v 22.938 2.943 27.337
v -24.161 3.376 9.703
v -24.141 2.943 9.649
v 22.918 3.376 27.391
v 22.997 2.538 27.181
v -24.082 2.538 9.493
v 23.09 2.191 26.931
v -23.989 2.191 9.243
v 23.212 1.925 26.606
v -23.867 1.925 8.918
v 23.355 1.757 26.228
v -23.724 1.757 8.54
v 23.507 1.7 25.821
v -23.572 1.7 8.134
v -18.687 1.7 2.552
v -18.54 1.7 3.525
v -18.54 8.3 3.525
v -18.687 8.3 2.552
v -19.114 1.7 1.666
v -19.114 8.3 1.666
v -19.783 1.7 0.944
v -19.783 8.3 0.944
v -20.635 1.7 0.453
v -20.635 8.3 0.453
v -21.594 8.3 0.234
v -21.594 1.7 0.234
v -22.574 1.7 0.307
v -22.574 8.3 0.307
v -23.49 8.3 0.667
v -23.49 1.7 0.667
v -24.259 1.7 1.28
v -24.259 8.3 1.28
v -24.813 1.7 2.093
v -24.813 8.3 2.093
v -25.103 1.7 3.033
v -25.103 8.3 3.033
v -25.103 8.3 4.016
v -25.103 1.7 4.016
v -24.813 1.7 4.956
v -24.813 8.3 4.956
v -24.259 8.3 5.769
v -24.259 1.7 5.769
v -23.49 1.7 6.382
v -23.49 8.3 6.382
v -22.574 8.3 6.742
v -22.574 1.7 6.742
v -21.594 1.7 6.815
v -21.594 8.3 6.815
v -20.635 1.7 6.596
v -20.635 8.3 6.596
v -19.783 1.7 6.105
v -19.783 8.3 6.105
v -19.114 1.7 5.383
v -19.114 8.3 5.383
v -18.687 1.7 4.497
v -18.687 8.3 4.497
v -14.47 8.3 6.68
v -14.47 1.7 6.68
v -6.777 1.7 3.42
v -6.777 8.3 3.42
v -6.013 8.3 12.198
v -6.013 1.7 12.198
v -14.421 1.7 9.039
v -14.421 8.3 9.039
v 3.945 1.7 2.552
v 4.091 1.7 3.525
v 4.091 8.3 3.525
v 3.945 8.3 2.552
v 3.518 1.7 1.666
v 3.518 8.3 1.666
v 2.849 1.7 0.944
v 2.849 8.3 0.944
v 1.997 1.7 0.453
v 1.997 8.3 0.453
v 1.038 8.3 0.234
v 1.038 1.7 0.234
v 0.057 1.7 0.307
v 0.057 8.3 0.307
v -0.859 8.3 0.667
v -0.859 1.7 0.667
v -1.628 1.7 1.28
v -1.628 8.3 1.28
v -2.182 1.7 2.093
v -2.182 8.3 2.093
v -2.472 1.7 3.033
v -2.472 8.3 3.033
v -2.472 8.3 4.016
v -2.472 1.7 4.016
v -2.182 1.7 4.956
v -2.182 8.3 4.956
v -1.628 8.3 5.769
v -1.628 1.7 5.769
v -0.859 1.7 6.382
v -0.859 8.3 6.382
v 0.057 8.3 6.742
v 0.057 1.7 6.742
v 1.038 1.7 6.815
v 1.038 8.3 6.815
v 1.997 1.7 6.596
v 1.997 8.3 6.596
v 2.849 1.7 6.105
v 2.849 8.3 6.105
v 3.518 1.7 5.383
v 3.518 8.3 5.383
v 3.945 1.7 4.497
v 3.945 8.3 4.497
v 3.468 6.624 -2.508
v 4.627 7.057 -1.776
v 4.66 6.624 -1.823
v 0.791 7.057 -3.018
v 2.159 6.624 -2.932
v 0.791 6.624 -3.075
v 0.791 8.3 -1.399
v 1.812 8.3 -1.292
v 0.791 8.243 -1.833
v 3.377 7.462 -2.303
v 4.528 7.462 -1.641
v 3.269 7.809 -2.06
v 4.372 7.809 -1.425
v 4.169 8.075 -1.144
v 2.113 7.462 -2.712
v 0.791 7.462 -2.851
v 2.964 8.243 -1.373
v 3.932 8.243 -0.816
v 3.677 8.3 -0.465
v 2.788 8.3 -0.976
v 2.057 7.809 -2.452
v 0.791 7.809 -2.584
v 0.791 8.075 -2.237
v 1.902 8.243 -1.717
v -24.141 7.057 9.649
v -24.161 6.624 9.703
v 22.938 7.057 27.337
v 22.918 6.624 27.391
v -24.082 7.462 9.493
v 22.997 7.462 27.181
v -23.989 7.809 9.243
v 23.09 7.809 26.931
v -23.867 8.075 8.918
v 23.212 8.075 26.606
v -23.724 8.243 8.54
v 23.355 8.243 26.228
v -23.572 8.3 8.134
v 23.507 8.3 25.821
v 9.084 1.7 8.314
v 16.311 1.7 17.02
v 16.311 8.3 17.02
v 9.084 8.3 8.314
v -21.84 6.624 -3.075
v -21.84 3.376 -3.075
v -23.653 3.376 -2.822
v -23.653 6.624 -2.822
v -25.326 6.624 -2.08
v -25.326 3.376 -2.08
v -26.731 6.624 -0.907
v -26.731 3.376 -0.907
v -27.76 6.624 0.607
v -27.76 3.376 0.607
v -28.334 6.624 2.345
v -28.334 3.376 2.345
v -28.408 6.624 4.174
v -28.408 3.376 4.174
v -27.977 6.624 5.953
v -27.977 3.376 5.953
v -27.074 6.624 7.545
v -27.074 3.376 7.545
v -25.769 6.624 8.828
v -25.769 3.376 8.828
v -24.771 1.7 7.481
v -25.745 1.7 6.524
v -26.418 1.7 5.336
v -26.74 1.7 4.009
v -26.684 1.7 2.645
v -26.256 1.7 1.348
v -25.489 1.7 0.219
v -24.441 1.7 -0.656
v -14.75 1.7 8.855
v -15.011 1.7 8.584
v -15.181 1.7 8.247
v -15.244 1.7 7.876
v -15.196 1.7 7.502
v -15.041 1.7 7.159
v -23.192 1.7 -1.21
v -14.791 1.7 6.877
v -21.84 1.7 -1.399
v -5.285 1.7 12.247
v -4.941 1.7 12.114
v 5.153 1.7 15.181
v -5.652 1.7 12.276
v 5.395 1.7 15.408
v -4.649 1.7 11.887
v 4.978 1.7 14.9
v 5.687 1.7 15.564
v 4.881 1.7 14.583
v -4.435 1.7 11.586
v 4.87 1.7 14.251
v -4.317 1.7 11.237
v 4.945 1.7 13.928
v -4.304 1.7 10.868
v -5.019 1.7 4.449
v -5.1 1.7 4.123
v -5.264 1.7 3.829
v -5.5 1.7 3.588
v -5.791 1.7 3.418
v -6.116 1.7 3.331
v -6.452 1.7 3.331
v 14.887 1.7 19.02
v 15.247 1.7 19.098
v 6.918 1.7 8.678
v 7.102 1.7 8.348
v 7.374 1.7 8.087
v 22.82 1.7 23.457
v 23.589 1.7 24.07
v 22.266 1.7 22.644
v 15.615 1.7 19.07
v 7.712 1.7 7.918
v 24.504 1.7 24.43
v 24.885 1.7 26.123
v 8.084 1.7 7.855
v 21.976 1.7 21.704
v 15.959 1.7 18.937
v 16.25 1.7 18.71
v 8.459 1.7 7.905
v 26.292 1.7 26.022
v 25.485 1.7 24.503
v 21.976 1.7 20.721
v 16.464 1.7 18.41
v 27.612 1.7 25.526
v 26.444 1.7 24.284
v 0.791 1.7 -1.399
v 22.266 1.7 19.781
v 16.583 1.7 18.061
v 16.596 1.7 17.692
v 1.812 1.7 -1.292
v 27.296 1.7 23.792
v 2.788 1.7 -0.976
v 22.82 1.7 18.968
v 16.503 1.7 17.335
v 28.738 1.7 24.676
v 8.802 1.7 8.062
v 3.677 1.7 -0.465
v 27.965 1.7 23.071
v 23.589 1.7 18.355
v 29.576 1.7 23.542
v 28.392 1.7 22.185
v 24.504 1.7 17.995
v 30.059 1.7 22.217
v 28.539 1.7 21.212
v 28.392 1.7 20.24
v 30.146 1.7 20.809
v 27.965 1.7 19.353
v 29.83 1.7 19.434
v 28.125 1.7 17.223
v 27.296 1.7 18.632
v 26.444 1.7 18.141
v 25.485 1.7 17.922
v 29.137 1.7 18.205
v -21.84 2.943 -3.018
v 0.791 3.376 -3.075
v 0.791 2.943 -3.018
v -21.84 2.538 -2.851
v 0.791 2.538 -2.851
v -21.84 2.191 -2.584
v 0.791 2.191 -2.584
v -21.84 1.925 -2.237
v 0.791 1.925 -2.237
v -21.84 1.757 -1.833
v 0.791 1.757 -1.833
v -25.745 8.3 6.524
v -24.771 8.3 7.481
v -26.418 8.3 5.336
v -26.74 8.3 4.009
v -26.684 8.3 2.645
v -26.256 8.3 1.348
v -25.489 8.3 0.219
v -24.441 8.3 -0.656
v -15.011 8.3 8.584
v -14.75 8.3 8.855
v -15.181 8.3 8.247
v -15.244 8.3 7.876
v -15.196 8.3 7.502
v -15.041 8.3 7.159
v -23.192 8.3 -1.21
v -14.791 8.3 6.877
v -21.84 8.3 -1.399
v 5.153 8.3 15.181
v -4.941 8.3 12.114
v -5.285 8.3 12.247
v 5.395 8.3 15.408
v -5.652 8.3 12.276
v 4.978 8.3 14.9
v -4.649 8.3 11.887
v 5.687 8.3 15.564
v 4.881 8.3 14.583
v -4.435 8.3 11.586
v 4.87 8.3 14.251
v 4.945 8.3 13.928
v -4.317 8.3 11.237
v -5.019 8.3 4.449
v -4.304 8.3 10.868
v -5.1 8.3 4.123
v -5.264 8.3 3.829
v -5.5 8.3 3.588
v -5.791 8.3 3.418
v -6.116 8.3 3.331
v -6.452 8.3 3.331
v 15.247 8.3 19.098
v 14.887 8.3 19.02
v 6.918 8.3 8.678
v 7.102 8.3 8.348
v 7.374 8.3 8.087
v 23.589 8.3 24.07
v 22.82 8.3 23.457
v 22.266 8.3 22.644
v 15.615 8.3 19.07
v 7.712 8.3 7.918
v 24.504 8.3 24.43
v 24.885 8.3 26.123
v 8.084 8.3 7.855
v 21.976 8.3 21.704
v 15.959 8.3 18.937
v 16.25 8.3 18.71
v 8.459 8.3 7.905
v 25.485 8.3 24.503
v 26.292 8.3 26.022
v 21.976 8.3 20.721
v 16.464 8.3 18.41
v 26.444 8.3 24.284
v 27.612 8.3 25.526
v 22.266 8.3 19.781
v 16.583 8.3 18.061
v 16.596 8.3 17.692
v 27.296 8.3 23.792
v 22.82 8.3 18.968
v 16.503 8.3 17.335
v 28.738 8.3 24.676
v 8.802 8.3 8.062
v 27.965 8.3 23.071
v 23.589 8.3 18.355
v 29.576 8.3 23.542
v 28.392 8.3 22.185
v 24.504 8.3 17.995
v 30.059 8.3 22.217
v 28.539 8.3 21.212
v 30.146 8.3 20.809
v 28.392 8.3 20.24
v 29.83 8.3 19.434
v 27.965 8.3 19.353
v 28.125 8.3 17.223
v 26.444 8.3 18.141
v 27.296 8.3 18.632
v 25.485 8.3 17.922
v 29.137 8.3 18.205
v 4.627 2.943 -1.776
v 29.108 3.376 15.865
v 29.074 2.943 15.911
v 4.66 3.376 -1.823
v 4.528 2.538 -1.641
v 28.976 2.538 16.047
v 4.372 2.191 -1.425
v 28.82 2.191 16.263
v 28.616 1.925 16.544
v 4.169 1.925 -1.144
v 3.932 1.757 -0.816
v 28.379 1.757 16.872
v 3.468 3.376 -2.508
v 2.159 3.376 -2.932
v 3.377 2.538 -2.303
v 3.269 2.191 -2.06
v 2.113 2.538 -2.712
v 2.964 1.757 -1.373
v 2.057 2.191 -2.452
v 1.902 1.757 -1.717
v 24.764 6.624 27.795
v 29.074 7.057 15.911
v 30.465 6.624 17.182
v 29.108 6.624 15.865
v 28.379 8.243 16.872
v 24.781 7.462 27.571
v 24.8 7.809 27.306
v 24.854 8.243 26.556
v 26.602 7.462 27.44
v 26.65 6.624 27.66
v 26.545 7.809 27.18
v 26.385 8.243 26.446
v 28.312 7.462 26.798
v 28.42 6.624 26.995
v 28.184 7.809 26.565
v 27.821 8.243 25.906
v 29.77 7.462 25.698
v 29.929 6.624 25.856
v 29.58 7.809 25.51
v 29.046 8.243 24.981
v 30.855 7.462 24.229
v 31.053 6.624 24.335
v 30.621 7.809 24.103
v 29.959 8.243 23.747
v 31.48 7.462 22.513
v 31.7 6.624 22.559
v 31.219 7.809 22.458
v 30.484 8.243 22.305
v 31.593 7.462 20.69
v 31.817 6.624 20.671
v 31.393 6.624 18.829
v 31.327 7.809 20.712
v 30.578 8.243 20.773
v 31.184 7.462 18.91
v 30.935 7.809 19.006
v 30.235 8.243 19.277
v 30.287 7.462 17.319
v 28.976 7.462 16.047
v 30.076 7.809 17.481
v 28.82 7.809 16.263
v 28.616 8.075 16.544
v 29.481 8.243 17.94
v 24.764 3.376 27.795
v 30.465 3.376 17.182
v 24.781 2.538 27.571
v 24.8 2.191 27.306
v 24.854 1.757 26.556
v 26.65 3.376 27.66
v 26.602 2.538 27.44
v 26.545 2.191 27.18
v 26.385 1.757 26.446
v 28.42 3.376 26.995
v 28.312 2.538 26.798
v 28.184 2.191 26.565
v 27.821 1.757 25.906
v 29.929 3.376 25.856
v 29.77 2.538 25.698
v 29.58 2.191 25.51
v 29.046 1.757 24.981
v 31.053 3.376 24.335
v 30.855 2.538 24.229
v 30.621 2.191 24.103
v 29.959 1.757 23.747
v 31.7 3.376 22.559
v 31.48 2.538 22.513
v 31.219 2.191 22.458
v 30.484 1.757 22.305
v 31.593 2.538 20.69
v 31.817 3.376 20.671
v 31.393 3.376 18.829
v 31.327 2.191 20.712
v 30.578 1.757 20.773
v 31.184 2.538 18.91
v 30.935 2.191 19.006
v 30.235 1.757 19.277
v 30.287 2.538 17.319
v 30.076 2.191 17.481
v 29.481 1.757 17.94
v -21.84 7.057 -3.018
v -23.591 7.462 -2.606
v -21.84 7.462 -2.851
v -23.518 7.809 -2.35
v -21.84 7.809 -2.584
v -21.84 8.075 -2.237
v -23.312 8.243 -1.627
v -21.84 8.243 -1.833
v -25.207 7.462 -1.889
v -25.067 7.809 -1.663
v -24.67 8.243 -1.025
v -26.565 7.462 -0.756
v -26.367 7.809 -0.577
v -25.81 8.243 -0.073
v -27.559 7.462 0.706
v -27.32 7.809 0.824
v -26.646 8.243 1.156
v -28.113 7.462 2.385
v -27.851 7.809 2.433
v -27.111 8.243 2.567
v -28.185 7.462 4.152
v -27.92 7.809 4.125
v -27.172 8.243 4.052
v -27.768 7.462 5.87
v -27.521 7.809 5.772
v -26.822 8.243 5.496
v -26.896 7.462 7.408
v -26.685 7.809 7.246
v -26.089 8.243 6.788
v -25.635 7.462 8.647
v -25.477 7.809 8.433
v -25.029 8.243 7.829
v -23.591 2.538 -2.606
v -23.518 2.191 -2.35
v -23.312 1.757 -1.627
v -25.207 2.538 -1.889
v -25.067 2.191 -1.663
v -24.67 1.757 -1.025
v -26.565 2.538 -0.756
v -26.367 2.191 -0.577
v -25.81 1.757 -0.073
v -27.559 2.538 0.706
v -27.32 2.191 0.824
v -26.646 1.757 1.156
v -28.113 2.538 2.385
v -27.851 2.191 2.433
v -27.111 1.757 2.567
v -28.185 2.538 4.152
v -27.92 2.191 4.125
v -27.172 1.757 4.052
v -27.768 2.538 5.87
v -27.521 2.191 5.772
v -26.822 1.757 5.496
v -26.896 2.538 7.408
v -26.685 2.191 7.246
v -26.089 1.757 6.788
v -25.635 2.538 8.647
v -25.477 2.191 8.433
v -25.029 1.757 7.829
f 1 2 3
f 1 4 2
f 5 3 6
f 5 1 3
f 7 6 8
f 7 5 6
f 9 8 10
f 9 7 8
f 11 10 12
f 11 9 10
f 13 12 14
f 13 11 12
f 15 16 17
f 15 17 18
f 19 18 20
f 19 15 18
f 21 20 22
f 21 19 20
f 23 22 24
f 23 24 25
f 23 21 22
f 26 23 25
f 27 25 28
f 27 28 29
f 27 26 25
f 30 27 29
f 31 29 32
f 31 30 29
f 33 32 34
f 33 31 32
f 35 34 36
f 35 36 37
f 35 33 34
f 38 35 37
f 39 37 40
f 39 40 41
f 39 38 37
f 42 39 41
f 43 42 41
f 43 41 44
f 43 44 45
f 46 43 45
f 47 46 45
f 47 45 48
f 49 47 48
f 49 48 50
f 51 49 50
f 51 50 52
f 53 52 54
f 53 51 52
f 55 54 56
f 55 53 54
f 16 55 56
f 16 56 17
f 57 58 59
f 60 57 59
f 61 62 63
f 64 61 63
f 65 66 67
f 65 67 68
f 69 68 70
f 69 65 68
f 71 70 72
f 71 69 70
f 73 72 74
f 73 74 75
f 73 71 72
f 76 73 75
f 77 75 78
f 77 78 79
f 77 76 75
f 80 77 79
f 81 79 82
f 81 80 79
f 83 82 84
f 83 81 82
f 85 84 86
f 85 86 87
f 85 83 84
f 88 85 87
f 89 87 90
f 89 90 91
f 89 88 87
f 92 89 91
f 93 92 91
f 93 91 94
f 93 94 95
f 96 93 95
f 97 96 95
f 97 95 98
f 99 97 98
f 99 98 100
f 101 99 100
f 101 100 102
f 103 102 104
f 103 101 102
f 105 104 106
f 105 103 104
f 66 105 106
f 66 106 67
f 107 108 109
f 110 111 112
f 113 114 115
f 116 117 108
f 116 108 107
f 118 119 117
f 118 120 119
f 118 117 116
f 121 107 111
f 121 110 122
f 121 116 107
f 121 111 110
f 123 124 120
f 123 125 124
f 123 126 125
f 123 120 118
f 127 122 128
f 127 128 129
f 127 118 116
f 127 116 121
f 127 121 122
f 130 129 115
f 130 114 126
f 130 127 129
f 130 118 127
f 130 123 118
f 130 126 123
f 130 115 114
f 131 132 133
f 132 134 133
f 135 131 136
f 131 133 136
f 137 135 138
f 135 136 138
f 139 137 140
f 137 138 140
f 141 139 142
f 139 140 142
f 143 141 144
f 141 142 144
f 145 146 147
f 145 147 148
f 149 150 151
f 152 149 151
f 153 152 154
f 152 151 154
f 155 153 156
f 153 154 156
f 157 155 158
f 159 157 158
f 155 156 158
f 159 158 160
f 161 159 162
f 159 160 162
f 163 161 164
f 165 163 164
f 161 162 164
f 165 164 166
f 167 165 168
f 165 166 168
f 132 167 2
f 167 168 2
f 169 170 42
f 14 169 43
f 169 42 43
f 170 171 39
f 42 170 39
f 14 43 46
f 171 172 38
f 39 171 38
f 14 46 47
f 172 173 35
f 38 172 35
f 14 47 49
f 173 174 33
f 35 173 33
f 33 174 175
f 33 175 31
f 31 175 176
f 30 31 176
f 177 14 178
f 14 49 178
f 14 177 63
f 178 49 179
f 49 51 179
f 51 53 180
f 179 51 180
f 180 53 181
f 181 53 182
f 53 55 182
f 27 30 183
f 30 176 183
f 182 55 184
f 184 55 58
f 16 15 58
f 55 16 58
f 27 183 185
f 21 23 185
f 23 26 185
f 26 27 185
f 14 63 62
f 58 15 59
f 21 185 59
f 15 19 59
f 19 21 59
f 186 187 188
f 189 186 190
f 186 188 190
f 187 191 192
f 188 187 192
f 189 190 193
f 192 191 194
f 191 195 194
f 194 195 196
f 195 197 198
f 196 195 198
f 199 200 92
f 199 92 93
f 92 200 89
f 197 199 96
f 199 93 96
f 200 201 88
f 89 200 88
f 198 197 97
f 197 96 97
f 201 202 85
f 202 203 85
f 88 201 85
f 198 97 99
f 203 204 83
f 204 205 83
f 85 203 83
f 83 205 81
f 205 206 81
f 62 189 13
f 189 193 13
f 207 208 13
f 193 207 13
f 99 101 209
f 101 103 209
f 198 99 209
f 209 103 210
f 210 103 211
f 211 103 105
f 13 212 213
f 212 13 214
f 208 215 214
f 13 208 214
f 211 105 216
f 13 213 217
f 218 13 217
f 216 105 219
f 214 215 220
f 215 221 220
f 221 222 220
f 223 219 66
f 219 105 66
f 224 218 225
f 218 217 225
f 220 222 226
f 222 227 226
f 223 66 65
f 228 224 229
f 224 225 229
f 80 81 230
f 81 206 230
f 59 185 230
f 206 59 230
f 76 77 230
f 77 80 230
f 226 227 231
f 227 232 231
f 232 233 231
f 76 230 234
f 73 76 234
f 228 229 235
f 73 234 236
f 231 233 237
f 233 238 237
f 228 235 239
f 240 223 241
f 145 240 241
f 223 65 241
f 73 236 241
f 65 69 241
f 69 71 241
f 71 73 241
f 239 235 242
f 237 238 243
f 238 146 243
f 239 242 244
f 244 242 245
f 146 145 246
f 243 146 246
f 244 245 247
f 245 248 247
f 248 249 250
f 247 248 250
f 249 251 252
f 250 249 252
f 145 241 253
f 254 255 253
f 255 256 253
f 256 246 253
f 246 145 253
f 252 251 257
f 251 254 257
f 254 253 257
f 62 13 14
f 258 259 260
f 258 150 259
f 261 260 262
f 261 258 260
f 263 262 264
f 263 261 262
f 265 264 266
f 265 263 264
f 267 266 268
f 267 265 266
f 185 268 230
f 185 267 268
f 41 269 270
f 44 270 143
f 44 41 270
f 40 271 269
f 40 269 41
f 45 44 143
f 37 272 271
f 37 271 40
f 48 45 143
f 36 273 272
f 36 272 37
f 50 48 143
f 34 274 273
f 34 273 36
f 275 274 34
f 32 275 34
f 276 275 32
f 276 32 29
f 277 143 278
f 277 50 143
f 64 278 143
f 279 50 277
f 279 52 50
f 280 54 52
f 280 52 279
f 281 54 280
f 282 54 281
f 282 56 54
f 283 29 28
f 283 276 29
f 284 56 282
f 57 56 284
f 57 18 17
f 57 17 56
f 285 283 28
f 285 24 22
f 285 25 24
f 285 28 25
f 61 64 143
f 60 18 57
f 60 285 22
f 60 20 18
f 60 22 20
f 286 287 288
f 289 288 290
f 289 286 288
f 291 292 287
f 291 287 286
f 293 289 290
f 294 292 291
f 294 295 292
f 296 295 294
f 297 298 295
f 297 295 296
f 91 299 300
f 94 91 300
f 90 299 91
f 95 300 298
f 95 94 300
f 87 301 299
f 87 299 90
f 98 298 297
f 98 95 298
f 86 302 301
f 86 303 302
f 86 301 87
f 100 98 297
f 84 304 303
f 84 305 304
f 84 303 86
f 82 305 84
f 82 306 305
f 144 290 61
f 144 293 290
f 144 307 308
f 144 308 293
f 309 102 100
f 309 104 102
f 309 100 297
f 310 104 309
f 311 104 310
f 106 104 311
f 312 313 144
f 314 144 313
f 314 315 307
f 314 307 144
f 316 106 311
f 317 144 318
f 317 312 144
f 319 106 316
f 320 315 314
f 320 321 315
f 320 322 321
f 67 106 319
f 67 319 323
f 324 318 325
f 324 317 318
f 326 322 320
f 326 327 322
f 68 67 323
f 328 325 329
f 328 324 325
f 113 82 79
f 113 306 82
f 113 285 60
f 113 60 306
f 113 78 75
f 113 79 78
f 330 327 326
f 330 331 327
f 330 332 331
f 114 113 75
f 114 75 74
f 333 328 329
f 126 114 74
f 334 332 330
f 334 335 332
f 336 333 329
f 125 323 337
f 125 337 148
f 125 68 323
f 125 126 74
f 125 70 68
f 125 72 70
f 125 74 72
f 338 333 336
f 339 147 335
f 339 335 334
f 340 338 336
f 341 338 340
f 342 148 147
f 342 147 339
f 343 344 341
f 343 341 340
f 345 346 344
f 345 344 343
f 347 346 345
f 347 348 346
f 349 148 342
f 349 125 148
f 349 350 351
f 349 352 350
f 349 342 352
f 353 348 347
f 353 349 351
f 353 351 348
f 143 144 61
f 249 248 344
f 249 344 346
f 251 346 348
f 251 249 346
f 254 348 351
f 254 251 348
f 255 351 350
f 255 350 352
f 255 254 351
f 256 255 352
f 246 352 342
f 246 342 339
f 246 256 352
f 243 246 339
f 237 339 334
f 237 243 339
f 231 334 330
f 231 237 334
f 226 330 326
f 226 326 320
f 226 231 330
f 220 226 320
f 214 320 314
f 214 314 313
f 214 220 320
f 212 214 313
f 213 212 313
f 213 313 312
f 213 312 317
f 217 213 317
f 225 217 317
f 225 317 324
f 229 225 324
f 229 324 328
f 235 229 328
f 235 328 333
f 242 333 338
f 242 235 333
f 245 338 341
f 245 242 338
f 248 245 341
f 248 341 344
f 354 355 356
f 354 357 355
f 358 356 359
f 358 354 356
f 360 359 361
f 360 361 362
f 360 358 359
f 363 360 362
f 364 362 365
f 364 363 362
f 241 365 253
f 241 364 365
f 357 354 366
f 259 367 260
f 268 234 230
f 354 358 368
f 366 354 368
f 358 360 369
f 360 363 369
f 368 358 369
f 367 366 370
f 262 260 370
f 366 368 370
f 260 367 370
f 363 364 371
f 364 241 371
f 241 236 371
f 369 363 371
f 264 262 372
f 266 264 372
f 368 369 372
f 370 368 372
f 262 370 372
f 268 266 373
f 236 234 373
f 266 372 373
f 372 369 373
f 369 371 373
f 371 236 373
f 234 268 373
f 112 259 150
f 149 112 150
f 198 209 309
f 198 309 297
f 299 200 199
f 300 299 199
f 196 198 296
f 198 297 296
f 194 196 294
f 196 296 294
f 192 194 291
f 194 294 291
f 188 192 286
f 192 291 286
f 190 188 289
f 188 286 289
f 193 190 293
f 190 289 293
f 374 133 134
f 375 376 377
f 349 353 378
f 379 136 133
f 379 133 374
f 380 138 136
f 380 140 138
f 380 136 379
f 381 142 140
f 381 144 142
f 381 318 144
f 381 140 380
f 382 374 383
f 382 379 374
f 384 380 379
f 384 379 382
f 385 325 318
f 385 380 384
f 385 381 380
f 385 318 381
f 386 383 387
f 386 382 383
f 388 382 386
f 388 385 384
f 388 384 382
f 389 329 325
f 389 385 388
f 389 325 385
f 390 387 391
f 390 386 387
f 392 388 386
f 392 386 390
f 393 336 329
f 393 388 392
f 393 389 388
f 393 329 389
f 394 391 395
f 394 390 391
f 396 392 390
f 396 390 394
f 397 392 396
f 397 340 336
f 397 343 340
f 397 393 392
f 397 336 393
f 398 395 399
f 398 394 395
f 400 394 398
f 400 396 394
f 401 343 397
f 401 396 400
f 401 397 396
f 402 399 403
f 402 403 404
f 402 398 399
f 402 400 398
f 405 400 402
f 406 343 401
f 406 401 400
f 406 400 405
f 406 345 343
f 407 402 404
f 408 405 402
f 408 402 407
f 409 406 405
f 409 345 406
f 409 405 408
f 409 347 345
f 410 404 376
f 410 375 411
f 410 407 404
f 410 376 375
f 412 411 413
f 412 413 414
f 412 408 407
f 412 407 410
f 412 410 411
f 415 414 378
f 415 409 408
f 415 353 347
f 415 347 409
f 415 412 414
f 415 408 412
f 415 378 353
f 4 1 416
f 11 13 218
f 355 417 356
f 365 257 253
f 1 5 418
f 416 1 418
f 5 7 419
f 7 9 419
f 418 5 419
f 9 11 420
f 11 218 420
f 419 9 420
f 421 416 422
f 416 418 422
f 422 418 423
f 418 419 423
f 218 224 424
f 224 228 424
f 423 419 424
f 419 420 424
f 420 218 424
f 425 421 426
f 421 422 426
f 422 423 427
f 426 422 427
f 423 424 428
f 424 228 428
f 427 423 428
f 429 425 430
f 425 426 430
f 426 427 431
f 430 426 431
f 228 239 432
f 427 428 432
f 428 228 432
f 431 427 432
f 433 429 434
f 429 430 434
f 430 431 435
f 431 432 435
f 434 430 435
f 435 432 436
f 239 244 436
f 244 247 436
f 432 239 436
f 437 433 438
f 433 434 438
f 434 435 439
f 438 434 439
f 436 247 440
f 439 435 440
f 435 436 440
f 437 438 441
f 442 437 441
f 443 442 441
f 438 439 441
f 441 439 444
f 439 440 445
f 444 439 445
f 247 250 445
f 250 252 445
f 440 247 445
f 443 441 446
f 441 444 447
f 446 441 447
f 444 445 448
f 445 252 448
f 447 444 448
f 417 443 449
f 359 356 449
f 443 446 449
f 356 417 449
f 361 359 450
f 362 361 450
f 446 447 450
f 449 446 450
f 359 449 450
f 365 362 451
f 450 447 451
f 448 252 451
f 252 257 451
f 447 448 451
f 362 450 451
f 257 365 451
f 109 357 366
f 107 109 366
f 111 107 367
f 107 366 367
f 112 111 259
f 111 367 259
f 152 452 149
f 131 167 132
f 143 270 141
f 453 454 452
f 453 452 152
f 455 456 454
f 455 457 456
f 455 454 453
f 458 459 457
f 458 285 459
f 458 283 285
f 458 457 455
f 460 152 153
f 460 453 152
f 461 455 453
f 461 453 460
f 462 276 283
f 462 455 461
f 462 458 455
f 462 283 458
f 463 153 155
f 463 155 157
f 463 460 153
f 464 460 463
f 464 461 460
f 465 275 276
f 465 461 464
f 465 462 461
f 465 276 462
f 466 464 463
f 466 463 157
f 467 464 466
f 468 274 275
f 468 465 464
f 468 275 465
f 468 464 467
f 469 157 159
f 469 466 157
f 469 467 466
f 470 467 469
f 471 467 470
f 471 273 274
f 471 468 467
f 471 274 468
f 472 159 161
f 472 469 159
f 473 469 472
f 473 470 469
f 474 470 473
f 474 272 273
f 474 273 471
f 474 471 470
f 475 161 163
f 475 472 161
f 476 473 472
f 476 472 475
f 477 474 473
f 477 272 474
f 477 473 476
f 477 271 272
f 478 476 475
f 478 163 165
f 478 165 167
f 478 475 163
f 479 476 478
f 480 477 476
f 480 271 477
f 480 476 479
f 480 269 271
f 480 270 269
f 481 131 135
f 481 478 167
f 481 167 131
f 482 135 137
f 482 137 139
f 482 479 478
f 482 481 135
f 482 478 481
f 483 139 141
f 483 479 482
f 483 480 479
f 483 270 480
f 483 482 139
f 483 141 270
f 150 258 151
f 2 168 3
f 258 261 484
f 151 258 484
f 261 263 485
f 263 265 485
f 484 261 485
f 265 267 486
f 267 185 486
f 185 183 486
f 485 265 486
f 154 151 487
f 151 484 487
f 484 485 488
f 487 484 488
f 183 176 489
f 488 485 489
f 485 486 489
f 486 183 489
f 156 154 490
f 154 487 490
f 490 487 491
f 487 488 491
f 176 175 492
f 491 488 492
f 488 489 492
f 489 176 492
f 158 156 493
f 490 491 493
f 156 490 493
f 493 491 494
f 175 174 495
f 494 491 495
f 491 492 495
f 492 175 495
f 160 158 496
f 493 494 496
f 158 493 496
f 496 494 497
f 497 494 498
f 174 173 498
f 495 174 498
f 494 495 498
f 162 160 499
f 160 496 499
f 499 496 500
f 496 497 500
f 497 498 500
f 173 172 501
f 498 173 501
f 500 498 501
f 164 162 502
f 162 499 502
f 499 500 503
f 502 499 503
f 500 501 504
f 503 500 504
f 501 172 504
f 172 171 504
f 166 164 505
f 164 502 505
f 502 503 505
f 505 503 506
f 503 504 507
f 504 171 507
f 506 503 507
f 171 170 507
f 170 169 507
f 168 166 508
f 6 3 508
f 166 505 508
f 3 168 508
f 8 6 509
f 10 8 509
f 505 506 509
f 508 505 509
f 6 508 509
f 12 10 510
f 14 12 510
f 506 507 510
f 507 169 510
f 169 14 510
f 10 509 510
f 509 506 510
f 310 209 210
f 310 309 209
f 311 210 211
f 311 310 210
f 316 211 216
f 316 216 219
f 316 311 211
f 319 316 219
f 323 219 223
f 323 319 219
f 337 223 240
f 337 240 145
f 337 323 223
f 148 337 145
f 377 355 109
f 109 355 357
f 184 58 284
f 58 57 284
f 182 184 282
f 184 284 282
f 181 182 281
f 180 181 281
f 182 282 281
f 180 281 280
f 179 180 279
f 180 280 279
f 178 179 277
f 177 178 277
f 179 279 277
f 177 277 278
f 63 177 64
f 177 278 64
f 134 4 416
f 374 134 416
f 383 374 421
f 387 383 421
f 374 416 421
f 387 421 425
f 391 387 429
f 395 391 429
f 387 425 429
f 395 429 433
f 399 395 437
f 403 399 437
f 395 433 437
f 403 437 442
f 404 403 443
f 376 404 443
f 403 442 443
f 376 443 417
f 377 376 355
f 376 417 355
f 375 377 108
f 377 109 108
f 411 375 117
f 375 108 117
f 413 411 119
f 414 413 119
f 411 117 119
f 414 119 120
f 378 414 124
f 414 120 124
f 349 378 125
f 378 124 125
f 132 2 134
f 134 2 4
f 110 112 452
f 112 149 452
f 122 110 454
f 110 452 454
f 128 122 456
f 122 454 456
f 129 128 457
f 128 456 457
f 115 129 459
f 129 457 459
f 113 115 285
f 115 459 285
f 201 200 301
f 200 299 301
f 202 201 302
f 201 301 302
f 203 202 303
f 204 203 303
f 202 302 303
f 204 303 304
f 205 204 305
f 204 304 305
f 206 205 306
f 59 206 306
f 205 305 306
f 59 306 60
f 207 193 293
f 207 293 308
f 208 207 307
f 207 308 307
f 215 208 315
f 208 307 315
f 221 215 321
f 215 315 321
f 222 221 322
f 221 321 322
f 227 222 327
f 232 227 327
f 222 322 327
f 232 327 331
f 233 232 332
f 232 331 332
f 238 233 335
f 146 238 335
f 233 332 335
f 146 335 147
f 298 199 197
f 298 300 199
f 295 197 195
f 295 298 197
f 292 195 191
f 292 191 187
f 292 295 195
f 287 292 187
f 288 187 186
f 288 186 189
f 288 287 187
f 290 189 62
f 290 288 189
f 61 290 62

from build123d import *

# Parameters (mm, degrees)
SKETCH1_R           = 5
BOSS_EXTRUDE1_DEPTH = 10
FILLET1_R           = 2.54
SCALE1_SCALE        = 0.66
FILLET2_R           = 1.27


with BuildPart() as part:
    # Sketch1 → Boss-Extrude1 (new body)
    with BuildSketch(Plane(origin=(0, 0, 0), x_dir=(1, 0, 0), z_dir=(0, 1, 0))):
        with BuildLine():
            Line((-37.807044038, -9.361111111), (33.524622629, -36.160986681))
            ThreePointArc((33.524622629, -36.160986681), (45.851500304, -31.531347991), (42.90340673, -18.698023718))
            Line((42.90340673, -18.698023718), (5.861740063, 8.101851852))
            ThreePointArc((5.861740063, 8.101851852), (3.080704585, 9.513635439), (0, 10))
            Line((0, 10), (-34.29, 10))
            ThreePointArc((-34.29, 10), (-44.128981429, 1.787300882), (-37.807044038, -9.361111111))
        make_face()
        with Locations((-34.29, 0)):
            Circle(SKETCH1_R, mode=Mode.SUBTRACT)
        Circle(SKETCH1_R, mode=Mode.SUBTRACT)
        with Locations((37.041666667, -26.79987557)):
            Circle(SKETCH1_R, mode=Mode.SUBTRACT)
        Polygon((-7.373318213, -14.24424589), (-27.557795825, -6.660776812), (-9.089196081, 1.165091942), align=None, mode=Mode.SUBTRACT)
        Polygon((10.448030186, -4.7063742), (5.617045705, -17.564724), (28.147439019, -26.029572301), align=None, mode=Mode.SUBTRACT)
    extrude(amount=BOSS_EXTRUDE1_DEPTH)

    # Fillet1
    fillet1_edges = [part.edges().sort_by_distance(p)[0] for p in [
        (45.851500304, 10, 31.531347991),
        (24.382573397, 10, 5.298085933),
        (3.080704585, 10, -9.513635439),
        (-17.145, 10, -10),
        (-44.128981429, 10, -1.787300882),
        (-17.145, 0, -10),
        (3.080704585, 0, -9.513635439),
        (24.382573397, 0, 5.298085933),
        (-2.141210705, 10, 22.761048896),
        (45.851500304, 0, 31.531347991),
        (-2.141210705, 0, 22.761048896),
        (-44.128981429, 0, -1.787300882),
    ]]
    fillet(fillet1_edges, radius=FILLET1_R)


with BuildPart() as part_1:
    # Scale1: scaled about (2.327239798, 5, 10.366216283)
    add(part.part.scale(SCALE1_SCALE).moved(Location((0.791261531, 1.7, 3.524513536))))

    # Fillet2
    fillet2_edges = [part_1.edges().sort_by_distance(p)[0] for p in [
        (-4.075128489, 5, 12.925715824),
        (-5.207607882, 5, 2.755552855),
        (-17.396883713, 5, 7.920626232),
        (19.368571284, 5, 20.704031255),
        (7.686961454, 5, 6.630720508),
        (4.498511697, 5, 15.117231376),
    ]]
    fillet(fillet2_edges, radius=FILLET2_R)


solid = part_1.part
